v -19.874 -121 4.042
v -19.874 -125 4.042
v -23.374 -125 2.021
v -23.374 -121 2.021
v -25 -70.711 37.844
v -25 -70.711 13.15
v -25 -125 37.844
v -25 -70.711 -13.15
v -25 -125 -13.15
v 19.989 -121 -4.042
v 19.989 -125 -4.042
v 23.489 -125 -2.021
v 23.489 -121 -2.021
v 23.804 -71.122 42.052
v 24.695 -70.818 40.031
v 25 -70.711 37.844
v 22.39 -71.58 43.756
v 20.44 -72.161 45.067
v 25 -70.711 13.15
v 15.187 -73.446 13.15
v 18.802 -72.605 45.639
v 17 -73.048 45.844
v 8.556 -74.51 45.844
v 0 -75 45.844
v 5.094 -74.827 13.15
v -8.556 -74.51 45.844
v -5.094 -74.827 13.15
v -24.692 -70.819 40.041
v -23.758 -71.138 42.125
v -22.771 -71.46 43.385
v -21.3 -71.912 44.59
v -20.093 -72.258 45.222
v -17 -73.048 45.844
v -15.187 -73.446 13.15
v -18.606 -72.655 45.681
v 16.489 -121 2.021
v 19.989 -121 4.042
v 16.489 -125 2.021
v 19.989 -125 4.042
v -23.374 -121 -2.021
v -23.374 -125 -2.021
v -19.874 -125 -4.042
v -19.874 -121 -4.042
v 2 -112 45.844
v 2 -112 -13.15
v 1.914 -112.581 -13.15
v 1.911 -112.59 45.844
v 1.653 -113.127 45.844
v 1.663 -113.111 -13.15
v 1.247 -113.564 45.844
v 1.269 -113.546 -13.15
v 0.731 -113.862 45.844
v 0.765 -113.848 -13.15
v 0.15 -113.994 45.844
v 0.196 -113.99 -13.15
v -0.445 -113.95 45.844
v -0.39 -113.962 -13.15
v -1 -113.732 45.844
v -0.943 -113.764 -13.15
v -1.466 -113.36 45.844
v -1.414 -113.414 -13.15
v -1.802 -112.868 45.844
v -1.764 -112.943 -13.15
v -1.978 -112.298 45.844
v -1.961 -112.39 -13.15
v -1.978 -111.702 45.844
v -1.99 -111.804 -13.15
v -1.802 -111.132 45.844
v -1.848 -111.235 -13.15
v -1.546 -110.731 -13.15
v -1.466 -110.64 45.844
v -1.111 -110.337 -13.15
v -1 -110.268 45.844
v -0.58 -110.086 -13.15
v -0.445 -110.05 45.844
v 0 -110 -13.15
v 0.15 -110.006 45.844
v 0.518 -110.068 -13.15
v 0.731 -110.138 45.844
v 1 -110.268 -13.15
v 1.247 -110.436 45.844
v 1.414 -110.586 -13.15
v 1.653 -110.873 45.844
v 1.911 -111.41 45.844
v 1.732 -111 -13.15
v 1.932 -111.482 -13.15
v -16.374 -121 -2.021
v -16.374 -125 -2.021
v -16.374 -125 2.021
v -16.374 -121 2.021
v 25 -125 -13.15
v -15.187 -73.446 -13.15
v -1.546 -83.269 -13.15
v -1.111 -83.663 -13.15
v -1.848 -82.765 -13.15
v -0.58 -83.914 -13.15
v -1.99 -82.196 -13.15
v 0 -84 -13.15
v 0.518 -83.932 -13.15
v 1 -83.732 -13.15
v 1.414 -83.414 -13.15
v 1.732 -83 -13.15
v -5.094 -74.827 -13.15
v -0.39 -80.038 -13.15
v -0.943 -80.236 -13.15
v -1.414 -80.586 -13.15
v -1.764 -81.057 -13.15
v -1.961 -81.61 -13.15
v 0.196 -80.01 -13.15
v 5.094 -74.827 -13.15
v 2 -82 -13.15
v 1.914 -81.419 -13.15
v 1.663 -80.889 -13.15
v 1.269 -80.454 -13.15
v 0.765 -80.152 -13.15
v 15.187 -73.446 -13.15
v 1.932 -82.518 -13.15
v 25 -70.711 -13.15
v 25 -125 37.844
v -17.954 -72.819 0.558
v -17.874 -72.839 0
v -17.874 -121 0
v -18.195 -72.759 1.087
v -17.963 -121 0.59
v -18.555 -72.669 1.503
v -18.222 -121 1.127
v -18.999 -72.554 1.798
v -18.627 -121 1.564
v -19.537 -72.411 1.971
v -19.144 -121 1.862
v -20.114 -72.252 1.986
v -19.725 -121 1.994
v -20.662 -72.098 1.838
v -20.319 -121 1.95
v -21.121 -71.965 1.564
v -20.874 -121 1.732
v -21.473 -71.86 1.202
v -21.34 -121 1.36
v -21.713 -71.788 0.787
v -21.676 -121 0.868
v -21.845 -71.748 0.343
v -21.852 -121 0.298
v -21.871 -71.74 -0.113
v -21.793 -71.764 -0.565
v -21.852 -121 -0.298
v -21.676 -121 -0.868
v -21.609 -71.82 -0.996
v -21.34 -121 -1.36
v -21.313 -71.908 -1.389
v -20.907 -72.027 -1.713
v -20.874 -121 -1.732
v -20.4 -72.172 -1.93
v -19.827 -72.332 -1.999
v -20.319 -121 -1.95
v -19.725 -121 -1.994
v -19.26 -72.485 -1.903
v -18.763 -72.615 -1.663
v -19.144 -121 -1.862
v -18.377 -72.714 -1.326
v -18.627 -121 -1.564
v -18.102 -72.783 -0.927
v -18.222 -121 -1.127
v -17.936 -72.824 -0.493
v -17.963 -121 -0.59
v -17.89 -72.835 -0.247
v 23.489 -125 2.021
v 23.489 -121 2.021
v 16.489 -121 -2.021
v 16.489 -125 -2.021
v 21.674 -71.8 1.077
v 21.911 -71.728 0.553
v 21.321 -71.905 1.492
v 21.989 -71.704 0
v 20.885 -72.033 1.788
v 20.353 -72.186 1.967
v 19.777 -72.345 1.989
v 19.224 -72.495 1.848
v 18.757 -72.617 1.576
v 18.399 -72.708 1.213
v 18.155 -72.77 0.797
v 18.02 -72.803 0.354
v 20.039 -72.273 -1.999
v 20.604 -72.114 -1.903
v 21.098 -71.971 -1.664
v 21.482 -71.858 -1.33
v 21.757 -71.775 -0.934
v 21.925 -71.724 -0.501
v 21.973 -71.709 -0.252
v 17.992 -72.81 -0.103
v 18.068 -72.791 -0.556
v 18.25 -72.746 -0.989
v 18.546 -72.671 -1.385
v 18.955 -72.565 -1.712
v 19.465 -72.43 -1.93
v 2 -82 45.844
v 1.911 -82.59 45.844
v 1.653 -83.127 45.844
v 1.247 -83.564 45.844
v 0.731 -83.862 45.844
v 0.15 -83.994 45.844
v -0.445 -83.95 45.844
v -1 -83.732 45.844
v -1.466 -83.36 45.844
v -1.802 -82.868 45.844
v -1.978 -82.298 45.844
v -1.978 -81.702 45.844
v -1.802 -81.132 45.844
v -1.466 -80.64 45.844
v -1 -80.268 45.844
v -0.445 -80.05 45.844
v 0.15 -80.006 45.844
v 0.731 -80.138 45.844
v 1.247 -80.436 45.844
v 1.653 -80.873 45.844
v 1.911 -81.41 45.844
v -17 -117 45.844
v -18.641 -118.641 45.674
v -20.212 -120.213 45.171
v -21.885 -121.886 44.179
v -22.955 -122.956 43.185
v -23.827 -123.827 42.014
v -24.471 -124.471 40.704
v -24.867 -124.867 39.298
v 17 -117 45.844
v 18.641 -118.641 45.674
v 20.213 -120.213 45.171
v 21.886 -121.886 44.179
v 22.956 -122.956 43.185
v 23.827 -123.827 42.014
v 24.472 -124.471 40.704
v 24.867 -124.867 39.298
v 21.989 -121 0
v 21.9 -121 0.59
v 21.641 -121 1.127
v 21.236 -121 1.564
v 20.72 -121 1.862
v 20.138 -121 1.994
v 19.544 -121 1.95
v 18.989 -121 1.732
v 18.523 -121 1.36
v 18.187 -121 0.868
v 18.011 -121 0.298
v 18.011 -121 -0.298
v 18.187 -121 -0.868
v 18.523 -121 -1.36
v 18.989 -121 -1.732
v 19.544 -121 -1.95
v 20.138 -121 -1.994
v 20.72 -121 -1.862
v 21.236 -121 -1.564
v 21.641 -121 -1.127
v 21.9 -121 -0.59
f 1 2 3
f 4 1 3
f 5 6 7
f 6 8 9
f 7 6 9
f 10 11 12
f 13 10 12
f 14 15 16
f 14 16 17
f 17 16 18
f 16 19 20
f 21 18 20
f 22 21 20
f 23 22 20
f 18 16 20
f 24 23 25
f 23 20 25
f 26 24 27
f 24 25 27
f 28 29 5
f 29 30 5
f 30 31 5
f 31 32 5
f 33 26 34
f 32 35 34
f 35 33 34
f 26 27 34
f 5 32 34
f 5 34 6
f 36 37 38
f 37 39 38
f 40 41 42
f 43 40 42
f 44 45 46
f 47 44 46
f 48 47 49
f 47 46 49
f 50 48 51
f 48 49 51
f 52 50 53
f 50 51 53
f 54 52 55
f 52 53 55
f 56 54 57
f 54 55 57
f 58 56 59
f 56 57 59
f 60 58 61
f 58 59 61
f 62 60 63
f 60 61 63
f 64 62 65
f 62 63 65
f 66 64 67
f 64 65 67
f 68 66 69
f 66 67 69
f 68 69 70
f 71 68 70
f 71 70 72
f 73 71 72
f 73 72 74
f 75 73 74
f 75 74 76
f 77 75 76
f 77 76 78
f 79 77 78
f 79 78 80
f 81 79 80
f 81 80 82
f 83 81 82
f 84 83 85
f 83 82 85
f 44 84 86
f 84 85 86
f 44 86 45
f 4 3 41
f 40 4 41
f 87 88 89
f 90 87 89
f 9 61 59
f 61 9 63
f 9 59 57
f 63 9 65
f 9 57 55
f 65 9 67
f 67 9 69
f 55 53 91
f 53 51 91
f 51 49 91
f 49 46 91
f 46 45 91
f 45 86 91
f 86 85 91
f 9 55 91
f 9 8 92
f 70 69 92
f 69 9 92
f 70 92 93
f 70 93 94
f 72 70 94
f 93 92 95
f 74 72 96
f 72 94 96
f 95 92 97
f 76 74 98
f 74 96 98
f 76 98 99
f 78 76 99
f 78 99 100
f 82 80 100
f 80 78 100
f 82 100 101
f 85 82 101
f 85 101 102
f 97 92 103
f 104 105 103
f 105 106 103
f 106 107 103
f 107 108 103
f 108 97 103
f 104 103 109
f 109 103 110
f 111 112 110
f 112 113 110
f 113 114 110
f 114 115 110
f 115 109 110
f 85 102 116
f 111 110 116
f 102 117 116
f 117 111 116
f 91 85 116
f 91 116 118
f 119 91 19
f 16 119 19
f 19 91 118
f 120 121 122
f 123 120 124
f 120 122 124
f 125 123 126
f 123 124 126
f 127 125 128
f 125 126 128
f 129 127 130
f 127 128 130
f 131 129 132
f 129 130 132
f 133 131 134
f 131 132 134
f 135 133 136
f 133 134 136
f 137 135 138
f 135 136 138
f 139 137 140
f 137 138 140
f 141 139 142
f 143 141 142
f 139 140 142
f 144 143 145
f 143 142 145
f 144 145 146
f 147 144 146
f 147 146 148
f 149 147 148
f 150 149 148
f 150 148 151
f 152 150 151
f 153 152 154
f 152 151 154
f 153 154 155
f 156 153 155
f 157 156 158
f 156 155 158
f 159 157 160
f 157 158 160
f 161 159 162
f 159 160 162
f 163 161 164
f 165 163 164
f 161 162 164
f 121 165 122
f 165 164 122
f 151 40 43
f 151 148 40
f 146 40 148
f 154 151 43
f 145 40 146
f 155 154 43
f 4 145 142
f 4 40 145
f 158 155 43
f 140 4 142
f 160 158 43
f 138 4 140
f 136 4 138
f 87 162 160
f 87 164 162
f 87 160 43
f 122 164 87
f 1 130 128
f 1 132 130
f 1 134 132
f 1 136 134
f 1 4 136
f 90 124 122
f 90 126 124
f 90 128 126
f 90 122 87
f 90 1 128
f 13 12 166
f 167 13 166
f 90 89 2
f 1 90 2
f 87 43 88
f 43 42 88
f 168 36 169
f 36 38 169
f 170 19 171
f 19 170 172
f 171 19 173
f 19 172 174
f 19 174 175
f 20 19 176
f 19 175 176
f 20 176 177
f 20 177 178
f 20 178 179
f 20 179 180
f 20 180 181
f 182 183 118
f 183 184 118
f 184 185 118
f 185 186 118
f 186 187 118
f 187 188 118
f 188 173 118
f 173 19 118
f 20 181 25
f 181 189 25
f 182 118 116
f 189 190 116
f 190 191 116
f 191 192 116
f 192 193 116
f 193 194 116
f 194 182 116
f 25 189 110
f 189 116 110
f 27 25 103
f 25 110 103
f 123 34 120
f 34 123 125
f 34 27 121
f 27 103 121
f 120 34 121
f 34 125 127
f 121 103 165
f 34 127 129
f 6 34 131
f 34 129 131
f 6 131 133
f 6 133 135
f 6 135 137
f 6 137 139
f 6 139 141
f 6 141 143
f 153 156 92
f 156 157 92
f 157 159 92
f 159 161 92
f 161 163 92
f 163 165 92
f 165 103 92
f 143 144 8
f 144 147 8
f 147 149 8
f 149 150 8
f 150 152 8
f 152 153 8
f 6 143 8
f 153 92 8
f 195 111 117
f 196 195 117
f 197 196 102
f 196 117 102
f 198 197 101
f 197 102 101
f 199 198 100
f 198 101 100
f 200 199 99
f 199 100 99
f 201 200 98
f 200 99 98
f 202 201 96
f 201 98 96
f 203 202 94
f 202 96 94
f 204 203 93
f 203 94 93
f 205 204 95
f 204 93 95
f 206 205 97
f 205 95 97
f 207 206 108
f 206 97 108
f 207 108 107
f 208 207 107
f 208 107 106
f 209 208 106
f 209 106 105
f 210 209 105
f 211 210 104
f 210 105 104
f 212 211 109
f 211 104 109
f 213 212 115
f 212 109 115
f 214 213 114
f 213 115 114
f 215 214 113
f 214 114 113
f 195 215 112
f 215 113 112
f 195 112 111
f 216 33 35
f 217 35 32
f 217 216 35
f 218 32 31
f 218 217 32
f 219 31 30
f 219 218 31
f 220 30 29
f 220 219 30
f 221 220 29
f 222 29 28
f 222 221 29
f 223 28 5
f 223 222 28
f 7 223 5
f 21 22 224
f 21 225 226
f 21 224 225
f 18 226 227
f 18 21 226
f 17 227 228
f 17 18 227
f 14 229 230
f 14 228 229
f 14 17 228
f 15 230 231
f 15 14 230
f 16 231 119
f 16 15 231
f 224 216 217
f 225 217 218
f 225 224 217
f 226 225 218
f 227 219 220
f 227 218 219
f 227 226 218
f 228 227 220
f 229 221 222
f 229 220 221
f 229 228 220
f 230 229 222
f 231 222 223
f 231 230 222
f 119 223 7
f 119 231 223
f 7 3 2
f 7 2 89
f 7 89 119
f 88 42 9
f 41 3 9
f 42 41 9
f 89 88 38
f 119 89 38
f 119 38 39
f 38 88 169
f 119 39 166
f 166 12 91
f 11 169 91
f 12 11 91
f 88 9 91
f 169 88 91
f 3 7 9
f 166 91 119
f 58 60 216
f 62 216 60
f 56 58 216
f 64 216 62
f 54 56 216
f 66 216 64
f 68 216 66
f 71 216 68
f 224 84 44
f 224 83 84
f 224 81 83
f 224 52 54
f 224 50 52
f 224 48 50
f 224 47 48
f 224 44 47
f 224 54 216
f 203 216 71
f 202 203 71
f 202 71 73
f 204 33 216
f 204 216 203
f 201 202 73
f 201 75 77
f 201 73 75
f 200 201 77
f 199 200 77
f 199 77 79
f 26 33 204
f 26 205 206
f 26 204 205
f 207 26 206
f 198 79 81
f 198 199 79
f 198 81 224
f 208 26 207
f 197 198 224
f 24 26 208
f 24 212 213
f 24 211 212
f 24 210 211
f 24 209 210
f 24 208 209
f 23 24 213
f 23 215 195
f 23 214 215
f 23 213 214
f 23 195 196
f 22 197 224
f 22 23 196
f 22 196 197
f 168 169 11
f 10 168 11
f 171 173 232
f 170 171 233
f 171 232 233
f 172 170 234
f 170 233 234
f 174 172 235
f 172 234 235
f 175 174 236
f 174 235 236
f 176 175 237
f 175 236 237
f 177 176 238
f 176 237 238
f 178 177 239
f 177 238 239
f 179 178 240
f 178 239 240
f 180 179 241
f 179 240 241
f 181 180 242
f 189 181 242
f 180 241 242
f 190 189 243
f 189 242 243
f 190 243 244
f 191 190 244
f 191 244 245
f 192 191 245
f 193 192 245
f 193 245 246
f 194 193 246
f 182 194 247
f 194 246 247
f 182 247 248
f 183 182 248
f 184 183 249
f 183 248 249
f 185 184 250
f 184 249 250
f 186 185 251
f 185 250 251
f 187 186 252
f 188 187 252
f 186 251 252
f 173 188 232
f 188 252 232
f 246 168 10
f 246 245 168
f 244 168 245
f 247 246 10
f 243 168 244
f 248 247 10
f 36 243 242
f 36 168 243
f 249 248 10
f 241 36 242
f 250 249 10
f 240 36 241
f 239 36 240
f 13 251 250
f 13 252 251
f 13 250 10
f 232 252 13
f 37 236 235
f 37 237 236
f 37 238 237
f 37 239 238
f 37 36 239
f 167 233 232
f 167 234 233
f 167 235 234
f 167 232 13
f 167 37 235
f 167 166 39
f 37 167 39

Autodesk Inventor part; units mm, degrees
ref_plane "YZ Plane" through (0, 0, 0) normal (1, 0, 0) x (0, 1, 0)
ref_plane "XZ Plane" through (0, 0, 0) normal (0, 1, 0) x (-1, 0, 0)
sketch "Sketch3" plane through (0, 0, 0) normal (0, 1, 0) x (-1, 0, 0)
  line L0 (0, 0) -> (0, 31.5556)
sketch "Sketch1" plane through (0, 0, 0) normal (0, 0, 1) x (1, 0, 0)
  circle A0 centre (0, 0) radius 75
  circle A1 centre (63.483, 20.6269) radius 6 construction
  circle A2 centre (-63.483, -20.6269) radius 6 construction
  circle A3 centre (0, 0) radius 69 construction
  line L0 (0, 0) -> (0.0001, -211.0949) construction
  arc A4 (-59.7327, 15.2299) -> (-60.2661, -15.5622) centre (-48.002, -0.374) ccw construction
  line L1 (0.2505, 0.4177) -> (-45.224, -139.5383) construction
  line L2 (-0.1358, 0.4177) -> (49.2707, -151.6398) construction
  line L3 (0, 0) -> (0.0001, -82)
  line L4 (0.0001, -82) -> (0.0001, -112)
  circle A5 centre (0.0001, -82) radius 2
  circle A6 centre (0.0001, -112) radius 2
  line L5 (0.0001, -82) -> (25.0001, -82)
  line L6 (0.0001, -82) -> (-24.9999, -82)
  line L7 (25.0001, -112) -> (25.0001, -70.7106)
  line L8 (-24.9999, -112) -> (-24.9999, -70.7107)
  line L9 (25.0001, -125) -> (25.0001, -112)
  line L10 (25.0001, -125) -> (-24.9999, -125)
  line L11 (-24.9999, -125) -> (-24.9999, -112)
  point P0 (56.6452, 18.2098)
  point P1 (56.6452, 18.2098)
  point P2 (57.7767, 18.7728)
  point P3 (56.6452, 18.2098)
  point P4 (57.7767, 18.7728)
  point P5 (56.6794, 18.5913)
  point P6 (-19.8743, -61.5198)
  point P7 (19.9889, -61.5198)
  point P8 (19.9889, -61.5198)
  point P9 (0.0001, -75)
  dimension "d19" = 12
  dimension "d66" = 12
  dimension "d4" = 150
  dimension "d59" = 66.75
  dimension "d67" = 63.483
  dimension "d68" = 138
  dimension "d147" = 18
  dimension "d148" = 18
  dimension "d157" = 82
  dimension "d158" = 30
  dimension "d159" = 4
  dimension "d160" = 4
  dimension "d161" = 25
  dimension "d162" = 25
  dimension "d163" = 25
  dimension "d164" = 25
  dimension "d165" = 50
ref_plane "Work Plane1" through (0, 0, 100) normal (0, 0, 1) x (1, 0, 0)
sketch "Sketch9" plane through (0, 0, 100) normal (0, 0, 1) x (1, 0, 0)
  circle A0 centre (0, 0) radius 75
  spline S0 degree 3 number of poles 235
  circle A1 centre (0, 0) radius 69
  line L0 (0, -270.1399) -> (0, 140.0417) construction
  line L1 (-118.2892, 0) -> (124.185, 0) construction
  point P0 (0, 0)
  point P1 (59.5, 0)
  point P2 (69, 0)
  dimension "d112" = 69
extrude "Extrusion7" [suppressed]
sketch "Sketch10" plane through (0, 0, 2.5) normal (0, 0, 1) x (1, 0, 0)
  circle A0 centre (69, 0) radius 1.5
  line L0 (71.75, -1.5877) -> (69, -3.1754)
  line L1 (69, -3.1754) -> (66.25, -1.5877)
  line L2 (66.25, -1.5877) -> (66.25, 1.5877)
  line L3 (66.25, 1.5877) -> (69, 3.1754)
  line L4 (69, 3.1754) -> (71.75, 1.5877)
  line L5 (71.75, 1.5877) -> (71.75, -1.5877)
  point P0 (0, 0)
  dimension "d115" = 3
  dimension "d118" = 5.5
extrude "Extrusion10" [suppressed]
pattern_circular "Circular Pattern4" [suppressed]
extrude "Extrusion8" [suppressed]
extrude "Extrusion9" [suppressed]
pattern_circular "Circular Pattern3" [suppressed]
extrude "Extrusion3" [suppressed]
sketch "Sketch12" plane through (0, 0, -13.15) normal (0, 0, -1) x (-1, 0, 0)
  circle A0 centre (0, 0) radius 69
  point P0 (-65.6229, -21.3222)
  dimension "d132" = 138
hole "Hole3" [suppressed]
pattern_circular "Circular Pattern5" [suppressed]
sketch "Sketch13" plane through (0, 0, 0) normal (0, 1, 0) x (-1, 0, 0)
  line L0 (-64.5572, 13.15) -> (64.4426, 13.15) projected
  line L1 (-64.5572, -13.15) -> (64.4426, -13.15) projected
  line L2 (75, 13.15) -> (-75, 13.15) projected
  line L3 (-23.4889, 2.0207) -> (-19.9889, 4.0415)
  line L4 (-19.9889, 4.0415) -> (-16.4889, 2.0207)
  line L5 (-16.4889, 2.0207) -> (-16.4889, -2.0207)
  line L6 (-16.4889, -2.0207) -> (-19.9889, -4.0415)
  line L7 (-19.9889, -4.0415) -> (-23.4889, -2.0207)
  line L8 (-23.4889, -2.0207) -> (-23.4889, 2.0207)
  line L9 (16.3743, 2.0207) -> (19.8743, 4.0415)
  line L10 (19.8743, 4.0415) -> (23.3743, 2.0207)
  line L11 (23.3743, 2.0207) -> (23.3743, -2.0207)
  line L12 (23.3743, -2.0207) -> (19.8743, -4.0415)
  line L13 (19.8743, -4.0415) -> (16.3743, -2.0207)
  line L14 (16.3743, -2.0207) -> (16.3743, 2.0207)
  circle A0 centre (19.8743, 0) radius 2
  circle A1 centre (-19.9889, 0) radius 2
  point P0 (0, 0)
  point P1 (-56.6452, 13.15)
  point P2 (-56.6452, -13.15)
  dimension "d149" = 7
  dimension "d150" = 7
  dimension "d153" = 4
  dimension "d154" = 4
extrude "Extrusion12" [suppressed]
extrude "Extrusion13" [suppressed]
extrude "Extrusion14" add sketch "Sketch1" along normal mid plane 26.3 contours A0 L3 A5 L6 L8 | L7 L5 A5 L3 A0 | L6 A5 L5 L7 L9 L10 L11 L8
sketch "Sketch14" plane through (-24.9999, -125, 13.15) normal (0, -1, 0) x (1, 0, 0)
  circle A0 centre (5.1257, -13.15) radius 2 projected
  line L0 (8.6257, -11.1293) -> (5.1257, -9.1085) projected
  line L1 (5.1257, -9.1085) -> (1.6257, -11.1293) projected
  line L2 (1.6257, -11.1293) -> (1.6257, -15.1707) projected
  line L3 (1.6257, -15.1707) -> (5.1257, -17.1915) projected
  line L4 (5.1257, -17.1915) -> (8.6257, -15.1707) projected
  line L5 (8.6257, -15.1707) -> (8.6257, -11.1293) projected
  line L6 (44.9889, -9.1085) -> (41.4889, -11.1293) projected
  circle A1 centre (44.9889, -13.15) radius 2 projected
  line L7 (48.4889, -11.1293) -> (44.9889, -9.1085) projected
  line L8 (48.4889, -15.1707) -> (48.4889, -11.1293) projected
  line L9 (44.9889, -17.1915) -> (48.4889, -15.1707) projected
  line L10 (41.4889, -15.1707) -> (44.9889, -17.1915) projected
  line L11 (41.4889, -11.1293) -> (41.4889, -15.1707) projected
  point P0 (24.9999, -13.15)
extrude "Extrusion15" cut sketch "Sketch14" against normal through all contours A0 | A1
extrude "Extrusion16" cut sketch "Sketch14" against normal blind 4 contours A0 | L5 L4 L3 L2 L1 L0 | L7 L8 L9 L10 L11 L6 | A1
sketch "Sketch15" plane through (0, 0, 13.15) normal (0, 0, 1) x (1, 0, 0)
  line L0 (-24.9999, -70.7107) -> (-24.9999, -125) projected
  line L1 (-24.9999, -125) -> (25.0001, -125) projected
  line L2 (25.0001, -125) -> (25.0001, -70.7106) projected
  arc A0 (-24.9999, -70.7107) -> (25.0001, -70.7106) centre (0, 0) ccw projected
  circle A1 centre (0.0001, -82) radius 2 projected
  circle A2 centre (0.0001, -112) radius 2 projected
  point P0 (0, 0)
  dimension "d99" = 156
extrude "Extrusion17" add sketch "Sketch15" along normal blind 32.694
fillet "Fillet2" radius 8 3 edges at (25.0001, -97.8553, 45.844) (-24.9999, -97.8554, 45.844) (0.0001, -125, 45.844)
sketch "Sketch8" plane through (0, 0, -13.15) normal (0, 0, -1) x (-1, 0, 0)
  circle A0 centre (0, 0) radius 78 projected
  arc A1 (-23.65, -105.9607) -> (-46.4722, -58.8671) centre (-83.65, -105.9607) ccw projected
  arc A2 (46.4722, -58.8671) -> (23.65, -105.9607) centre (83.65, -105.9607) ccw projected
  line L0 (23.65, -200) -> (23.65, -105.9607) projected
  line L1 (-23.65, -105.9607) -> (-23.65, -200) projected
  arc A3 (-23.65, -200) -> (23.65, -200) centre (0, -181.5425) ccw projected
  point P0 (36.3948, -68.9886)
  point P1 (-36.3948, -68.9886)
sketch "Sketch11" plane through (0, 0, 2.5) normal (0, 0, 1) x (1, 0, 0)
  circle A0 centre (0, 0) radius 11.25
  dimension "d129" = 22.5
equation "\"Axle_diameter\" = 6"
equation "\"Compensation\" = 0.45"
equation "\"Bearing_Outer_Hole_Location\" = 138"
equation "\"Printer_Gap_Fit\" = 0.1"
equation "\"Printer_Gap_Slide\" = 0.3"
equation "\"Bearing_Roller_Diameter\" = 8"
equation "\"Fastners_ScrewHeadThickness\" = 2"
equation "\"Fastners_OuterThicknessFromScrew\" = 5"
equation "\"Fastners_InnerThicknessFromScrew\" = 2"
equation "\"Fastners_OutputAxisHeadThickness\" = 2"
equation "\"Printer_HoleCompensation\" = 0"
equation "\"Bearing_Outer_Radius\" = 75"
equation "\"Bearing_Thicness_compensation\" = 0.27244"
equation "\"Bearing_To_12mm\" = 0.27244"
equation "\"Bearing_Inner_Hole_Location\" = 84"
equation "\"Housing_Outer_Hole_Location\" = 138"
equation "\"Bearing_Gap_Fit\" = 0.1"
equation "\"Bearing_Gap_Slide\" = 0.43"
equation "\"Bearing_ScrewHeadThickness\" = 2"
equation "\"Bearing_OuterThicknessFromScrew\" = 5"
equation "\"Bearing_InnerThicknessFromScrew\" = 2"
equation "\"Bearing_OutputAxisHeadThickness\" = 2"
equation "\"Bearing_HoleCompensation\" = 0.5"
equation "\"Roller_radius\" = 5"
equation "\"Pin_set_dimention\" = 22"
equation "\"Pin_bearing_outer_dimention\" = 22"
equation "\"Shaft_dimention\" = 2"
equation "\"Pin_bearing_inner_dimention\" = 3"
equation "\"Rotor_dimention\" = 125"
equation "\"Rotor_radius\" = 62.5"
equation "\"Outer_rotor_radius\" = 65"
equation "\"Output_hole_set_diameter\" = 24.5"
equation "\"Bearing_ScrewDiameter\" = 3.5"
equation "\"Bearing_ScrewHeadDiameter\" = 5.5"
equation "\"Bearing_OutputAxisHeadDiameter\" = 8.5"
equation "\"BearingHoleThrough\" = 12"
equation "\"Fastners_ScrewDiameter\" = 3"
equation "\"Bearing_OutputAxisDiameter\" = 6"
equation "\"Fastners_ScrewHeadDiameter\" = 5"
equation "\"Fastners_OutputAxisHeadDiameter\" = 12"
equation "\"BraceMountThickness\" = 47.3"
equation "\"R\" = 1"
equation "\"Rr\" = 1"
equation "\"Ece\" = 1"
equation "\"Num\" = 1"
equation "\"formula\" = 1"
properties part number "AttatchmentUpper" material "ABS Plastic"
